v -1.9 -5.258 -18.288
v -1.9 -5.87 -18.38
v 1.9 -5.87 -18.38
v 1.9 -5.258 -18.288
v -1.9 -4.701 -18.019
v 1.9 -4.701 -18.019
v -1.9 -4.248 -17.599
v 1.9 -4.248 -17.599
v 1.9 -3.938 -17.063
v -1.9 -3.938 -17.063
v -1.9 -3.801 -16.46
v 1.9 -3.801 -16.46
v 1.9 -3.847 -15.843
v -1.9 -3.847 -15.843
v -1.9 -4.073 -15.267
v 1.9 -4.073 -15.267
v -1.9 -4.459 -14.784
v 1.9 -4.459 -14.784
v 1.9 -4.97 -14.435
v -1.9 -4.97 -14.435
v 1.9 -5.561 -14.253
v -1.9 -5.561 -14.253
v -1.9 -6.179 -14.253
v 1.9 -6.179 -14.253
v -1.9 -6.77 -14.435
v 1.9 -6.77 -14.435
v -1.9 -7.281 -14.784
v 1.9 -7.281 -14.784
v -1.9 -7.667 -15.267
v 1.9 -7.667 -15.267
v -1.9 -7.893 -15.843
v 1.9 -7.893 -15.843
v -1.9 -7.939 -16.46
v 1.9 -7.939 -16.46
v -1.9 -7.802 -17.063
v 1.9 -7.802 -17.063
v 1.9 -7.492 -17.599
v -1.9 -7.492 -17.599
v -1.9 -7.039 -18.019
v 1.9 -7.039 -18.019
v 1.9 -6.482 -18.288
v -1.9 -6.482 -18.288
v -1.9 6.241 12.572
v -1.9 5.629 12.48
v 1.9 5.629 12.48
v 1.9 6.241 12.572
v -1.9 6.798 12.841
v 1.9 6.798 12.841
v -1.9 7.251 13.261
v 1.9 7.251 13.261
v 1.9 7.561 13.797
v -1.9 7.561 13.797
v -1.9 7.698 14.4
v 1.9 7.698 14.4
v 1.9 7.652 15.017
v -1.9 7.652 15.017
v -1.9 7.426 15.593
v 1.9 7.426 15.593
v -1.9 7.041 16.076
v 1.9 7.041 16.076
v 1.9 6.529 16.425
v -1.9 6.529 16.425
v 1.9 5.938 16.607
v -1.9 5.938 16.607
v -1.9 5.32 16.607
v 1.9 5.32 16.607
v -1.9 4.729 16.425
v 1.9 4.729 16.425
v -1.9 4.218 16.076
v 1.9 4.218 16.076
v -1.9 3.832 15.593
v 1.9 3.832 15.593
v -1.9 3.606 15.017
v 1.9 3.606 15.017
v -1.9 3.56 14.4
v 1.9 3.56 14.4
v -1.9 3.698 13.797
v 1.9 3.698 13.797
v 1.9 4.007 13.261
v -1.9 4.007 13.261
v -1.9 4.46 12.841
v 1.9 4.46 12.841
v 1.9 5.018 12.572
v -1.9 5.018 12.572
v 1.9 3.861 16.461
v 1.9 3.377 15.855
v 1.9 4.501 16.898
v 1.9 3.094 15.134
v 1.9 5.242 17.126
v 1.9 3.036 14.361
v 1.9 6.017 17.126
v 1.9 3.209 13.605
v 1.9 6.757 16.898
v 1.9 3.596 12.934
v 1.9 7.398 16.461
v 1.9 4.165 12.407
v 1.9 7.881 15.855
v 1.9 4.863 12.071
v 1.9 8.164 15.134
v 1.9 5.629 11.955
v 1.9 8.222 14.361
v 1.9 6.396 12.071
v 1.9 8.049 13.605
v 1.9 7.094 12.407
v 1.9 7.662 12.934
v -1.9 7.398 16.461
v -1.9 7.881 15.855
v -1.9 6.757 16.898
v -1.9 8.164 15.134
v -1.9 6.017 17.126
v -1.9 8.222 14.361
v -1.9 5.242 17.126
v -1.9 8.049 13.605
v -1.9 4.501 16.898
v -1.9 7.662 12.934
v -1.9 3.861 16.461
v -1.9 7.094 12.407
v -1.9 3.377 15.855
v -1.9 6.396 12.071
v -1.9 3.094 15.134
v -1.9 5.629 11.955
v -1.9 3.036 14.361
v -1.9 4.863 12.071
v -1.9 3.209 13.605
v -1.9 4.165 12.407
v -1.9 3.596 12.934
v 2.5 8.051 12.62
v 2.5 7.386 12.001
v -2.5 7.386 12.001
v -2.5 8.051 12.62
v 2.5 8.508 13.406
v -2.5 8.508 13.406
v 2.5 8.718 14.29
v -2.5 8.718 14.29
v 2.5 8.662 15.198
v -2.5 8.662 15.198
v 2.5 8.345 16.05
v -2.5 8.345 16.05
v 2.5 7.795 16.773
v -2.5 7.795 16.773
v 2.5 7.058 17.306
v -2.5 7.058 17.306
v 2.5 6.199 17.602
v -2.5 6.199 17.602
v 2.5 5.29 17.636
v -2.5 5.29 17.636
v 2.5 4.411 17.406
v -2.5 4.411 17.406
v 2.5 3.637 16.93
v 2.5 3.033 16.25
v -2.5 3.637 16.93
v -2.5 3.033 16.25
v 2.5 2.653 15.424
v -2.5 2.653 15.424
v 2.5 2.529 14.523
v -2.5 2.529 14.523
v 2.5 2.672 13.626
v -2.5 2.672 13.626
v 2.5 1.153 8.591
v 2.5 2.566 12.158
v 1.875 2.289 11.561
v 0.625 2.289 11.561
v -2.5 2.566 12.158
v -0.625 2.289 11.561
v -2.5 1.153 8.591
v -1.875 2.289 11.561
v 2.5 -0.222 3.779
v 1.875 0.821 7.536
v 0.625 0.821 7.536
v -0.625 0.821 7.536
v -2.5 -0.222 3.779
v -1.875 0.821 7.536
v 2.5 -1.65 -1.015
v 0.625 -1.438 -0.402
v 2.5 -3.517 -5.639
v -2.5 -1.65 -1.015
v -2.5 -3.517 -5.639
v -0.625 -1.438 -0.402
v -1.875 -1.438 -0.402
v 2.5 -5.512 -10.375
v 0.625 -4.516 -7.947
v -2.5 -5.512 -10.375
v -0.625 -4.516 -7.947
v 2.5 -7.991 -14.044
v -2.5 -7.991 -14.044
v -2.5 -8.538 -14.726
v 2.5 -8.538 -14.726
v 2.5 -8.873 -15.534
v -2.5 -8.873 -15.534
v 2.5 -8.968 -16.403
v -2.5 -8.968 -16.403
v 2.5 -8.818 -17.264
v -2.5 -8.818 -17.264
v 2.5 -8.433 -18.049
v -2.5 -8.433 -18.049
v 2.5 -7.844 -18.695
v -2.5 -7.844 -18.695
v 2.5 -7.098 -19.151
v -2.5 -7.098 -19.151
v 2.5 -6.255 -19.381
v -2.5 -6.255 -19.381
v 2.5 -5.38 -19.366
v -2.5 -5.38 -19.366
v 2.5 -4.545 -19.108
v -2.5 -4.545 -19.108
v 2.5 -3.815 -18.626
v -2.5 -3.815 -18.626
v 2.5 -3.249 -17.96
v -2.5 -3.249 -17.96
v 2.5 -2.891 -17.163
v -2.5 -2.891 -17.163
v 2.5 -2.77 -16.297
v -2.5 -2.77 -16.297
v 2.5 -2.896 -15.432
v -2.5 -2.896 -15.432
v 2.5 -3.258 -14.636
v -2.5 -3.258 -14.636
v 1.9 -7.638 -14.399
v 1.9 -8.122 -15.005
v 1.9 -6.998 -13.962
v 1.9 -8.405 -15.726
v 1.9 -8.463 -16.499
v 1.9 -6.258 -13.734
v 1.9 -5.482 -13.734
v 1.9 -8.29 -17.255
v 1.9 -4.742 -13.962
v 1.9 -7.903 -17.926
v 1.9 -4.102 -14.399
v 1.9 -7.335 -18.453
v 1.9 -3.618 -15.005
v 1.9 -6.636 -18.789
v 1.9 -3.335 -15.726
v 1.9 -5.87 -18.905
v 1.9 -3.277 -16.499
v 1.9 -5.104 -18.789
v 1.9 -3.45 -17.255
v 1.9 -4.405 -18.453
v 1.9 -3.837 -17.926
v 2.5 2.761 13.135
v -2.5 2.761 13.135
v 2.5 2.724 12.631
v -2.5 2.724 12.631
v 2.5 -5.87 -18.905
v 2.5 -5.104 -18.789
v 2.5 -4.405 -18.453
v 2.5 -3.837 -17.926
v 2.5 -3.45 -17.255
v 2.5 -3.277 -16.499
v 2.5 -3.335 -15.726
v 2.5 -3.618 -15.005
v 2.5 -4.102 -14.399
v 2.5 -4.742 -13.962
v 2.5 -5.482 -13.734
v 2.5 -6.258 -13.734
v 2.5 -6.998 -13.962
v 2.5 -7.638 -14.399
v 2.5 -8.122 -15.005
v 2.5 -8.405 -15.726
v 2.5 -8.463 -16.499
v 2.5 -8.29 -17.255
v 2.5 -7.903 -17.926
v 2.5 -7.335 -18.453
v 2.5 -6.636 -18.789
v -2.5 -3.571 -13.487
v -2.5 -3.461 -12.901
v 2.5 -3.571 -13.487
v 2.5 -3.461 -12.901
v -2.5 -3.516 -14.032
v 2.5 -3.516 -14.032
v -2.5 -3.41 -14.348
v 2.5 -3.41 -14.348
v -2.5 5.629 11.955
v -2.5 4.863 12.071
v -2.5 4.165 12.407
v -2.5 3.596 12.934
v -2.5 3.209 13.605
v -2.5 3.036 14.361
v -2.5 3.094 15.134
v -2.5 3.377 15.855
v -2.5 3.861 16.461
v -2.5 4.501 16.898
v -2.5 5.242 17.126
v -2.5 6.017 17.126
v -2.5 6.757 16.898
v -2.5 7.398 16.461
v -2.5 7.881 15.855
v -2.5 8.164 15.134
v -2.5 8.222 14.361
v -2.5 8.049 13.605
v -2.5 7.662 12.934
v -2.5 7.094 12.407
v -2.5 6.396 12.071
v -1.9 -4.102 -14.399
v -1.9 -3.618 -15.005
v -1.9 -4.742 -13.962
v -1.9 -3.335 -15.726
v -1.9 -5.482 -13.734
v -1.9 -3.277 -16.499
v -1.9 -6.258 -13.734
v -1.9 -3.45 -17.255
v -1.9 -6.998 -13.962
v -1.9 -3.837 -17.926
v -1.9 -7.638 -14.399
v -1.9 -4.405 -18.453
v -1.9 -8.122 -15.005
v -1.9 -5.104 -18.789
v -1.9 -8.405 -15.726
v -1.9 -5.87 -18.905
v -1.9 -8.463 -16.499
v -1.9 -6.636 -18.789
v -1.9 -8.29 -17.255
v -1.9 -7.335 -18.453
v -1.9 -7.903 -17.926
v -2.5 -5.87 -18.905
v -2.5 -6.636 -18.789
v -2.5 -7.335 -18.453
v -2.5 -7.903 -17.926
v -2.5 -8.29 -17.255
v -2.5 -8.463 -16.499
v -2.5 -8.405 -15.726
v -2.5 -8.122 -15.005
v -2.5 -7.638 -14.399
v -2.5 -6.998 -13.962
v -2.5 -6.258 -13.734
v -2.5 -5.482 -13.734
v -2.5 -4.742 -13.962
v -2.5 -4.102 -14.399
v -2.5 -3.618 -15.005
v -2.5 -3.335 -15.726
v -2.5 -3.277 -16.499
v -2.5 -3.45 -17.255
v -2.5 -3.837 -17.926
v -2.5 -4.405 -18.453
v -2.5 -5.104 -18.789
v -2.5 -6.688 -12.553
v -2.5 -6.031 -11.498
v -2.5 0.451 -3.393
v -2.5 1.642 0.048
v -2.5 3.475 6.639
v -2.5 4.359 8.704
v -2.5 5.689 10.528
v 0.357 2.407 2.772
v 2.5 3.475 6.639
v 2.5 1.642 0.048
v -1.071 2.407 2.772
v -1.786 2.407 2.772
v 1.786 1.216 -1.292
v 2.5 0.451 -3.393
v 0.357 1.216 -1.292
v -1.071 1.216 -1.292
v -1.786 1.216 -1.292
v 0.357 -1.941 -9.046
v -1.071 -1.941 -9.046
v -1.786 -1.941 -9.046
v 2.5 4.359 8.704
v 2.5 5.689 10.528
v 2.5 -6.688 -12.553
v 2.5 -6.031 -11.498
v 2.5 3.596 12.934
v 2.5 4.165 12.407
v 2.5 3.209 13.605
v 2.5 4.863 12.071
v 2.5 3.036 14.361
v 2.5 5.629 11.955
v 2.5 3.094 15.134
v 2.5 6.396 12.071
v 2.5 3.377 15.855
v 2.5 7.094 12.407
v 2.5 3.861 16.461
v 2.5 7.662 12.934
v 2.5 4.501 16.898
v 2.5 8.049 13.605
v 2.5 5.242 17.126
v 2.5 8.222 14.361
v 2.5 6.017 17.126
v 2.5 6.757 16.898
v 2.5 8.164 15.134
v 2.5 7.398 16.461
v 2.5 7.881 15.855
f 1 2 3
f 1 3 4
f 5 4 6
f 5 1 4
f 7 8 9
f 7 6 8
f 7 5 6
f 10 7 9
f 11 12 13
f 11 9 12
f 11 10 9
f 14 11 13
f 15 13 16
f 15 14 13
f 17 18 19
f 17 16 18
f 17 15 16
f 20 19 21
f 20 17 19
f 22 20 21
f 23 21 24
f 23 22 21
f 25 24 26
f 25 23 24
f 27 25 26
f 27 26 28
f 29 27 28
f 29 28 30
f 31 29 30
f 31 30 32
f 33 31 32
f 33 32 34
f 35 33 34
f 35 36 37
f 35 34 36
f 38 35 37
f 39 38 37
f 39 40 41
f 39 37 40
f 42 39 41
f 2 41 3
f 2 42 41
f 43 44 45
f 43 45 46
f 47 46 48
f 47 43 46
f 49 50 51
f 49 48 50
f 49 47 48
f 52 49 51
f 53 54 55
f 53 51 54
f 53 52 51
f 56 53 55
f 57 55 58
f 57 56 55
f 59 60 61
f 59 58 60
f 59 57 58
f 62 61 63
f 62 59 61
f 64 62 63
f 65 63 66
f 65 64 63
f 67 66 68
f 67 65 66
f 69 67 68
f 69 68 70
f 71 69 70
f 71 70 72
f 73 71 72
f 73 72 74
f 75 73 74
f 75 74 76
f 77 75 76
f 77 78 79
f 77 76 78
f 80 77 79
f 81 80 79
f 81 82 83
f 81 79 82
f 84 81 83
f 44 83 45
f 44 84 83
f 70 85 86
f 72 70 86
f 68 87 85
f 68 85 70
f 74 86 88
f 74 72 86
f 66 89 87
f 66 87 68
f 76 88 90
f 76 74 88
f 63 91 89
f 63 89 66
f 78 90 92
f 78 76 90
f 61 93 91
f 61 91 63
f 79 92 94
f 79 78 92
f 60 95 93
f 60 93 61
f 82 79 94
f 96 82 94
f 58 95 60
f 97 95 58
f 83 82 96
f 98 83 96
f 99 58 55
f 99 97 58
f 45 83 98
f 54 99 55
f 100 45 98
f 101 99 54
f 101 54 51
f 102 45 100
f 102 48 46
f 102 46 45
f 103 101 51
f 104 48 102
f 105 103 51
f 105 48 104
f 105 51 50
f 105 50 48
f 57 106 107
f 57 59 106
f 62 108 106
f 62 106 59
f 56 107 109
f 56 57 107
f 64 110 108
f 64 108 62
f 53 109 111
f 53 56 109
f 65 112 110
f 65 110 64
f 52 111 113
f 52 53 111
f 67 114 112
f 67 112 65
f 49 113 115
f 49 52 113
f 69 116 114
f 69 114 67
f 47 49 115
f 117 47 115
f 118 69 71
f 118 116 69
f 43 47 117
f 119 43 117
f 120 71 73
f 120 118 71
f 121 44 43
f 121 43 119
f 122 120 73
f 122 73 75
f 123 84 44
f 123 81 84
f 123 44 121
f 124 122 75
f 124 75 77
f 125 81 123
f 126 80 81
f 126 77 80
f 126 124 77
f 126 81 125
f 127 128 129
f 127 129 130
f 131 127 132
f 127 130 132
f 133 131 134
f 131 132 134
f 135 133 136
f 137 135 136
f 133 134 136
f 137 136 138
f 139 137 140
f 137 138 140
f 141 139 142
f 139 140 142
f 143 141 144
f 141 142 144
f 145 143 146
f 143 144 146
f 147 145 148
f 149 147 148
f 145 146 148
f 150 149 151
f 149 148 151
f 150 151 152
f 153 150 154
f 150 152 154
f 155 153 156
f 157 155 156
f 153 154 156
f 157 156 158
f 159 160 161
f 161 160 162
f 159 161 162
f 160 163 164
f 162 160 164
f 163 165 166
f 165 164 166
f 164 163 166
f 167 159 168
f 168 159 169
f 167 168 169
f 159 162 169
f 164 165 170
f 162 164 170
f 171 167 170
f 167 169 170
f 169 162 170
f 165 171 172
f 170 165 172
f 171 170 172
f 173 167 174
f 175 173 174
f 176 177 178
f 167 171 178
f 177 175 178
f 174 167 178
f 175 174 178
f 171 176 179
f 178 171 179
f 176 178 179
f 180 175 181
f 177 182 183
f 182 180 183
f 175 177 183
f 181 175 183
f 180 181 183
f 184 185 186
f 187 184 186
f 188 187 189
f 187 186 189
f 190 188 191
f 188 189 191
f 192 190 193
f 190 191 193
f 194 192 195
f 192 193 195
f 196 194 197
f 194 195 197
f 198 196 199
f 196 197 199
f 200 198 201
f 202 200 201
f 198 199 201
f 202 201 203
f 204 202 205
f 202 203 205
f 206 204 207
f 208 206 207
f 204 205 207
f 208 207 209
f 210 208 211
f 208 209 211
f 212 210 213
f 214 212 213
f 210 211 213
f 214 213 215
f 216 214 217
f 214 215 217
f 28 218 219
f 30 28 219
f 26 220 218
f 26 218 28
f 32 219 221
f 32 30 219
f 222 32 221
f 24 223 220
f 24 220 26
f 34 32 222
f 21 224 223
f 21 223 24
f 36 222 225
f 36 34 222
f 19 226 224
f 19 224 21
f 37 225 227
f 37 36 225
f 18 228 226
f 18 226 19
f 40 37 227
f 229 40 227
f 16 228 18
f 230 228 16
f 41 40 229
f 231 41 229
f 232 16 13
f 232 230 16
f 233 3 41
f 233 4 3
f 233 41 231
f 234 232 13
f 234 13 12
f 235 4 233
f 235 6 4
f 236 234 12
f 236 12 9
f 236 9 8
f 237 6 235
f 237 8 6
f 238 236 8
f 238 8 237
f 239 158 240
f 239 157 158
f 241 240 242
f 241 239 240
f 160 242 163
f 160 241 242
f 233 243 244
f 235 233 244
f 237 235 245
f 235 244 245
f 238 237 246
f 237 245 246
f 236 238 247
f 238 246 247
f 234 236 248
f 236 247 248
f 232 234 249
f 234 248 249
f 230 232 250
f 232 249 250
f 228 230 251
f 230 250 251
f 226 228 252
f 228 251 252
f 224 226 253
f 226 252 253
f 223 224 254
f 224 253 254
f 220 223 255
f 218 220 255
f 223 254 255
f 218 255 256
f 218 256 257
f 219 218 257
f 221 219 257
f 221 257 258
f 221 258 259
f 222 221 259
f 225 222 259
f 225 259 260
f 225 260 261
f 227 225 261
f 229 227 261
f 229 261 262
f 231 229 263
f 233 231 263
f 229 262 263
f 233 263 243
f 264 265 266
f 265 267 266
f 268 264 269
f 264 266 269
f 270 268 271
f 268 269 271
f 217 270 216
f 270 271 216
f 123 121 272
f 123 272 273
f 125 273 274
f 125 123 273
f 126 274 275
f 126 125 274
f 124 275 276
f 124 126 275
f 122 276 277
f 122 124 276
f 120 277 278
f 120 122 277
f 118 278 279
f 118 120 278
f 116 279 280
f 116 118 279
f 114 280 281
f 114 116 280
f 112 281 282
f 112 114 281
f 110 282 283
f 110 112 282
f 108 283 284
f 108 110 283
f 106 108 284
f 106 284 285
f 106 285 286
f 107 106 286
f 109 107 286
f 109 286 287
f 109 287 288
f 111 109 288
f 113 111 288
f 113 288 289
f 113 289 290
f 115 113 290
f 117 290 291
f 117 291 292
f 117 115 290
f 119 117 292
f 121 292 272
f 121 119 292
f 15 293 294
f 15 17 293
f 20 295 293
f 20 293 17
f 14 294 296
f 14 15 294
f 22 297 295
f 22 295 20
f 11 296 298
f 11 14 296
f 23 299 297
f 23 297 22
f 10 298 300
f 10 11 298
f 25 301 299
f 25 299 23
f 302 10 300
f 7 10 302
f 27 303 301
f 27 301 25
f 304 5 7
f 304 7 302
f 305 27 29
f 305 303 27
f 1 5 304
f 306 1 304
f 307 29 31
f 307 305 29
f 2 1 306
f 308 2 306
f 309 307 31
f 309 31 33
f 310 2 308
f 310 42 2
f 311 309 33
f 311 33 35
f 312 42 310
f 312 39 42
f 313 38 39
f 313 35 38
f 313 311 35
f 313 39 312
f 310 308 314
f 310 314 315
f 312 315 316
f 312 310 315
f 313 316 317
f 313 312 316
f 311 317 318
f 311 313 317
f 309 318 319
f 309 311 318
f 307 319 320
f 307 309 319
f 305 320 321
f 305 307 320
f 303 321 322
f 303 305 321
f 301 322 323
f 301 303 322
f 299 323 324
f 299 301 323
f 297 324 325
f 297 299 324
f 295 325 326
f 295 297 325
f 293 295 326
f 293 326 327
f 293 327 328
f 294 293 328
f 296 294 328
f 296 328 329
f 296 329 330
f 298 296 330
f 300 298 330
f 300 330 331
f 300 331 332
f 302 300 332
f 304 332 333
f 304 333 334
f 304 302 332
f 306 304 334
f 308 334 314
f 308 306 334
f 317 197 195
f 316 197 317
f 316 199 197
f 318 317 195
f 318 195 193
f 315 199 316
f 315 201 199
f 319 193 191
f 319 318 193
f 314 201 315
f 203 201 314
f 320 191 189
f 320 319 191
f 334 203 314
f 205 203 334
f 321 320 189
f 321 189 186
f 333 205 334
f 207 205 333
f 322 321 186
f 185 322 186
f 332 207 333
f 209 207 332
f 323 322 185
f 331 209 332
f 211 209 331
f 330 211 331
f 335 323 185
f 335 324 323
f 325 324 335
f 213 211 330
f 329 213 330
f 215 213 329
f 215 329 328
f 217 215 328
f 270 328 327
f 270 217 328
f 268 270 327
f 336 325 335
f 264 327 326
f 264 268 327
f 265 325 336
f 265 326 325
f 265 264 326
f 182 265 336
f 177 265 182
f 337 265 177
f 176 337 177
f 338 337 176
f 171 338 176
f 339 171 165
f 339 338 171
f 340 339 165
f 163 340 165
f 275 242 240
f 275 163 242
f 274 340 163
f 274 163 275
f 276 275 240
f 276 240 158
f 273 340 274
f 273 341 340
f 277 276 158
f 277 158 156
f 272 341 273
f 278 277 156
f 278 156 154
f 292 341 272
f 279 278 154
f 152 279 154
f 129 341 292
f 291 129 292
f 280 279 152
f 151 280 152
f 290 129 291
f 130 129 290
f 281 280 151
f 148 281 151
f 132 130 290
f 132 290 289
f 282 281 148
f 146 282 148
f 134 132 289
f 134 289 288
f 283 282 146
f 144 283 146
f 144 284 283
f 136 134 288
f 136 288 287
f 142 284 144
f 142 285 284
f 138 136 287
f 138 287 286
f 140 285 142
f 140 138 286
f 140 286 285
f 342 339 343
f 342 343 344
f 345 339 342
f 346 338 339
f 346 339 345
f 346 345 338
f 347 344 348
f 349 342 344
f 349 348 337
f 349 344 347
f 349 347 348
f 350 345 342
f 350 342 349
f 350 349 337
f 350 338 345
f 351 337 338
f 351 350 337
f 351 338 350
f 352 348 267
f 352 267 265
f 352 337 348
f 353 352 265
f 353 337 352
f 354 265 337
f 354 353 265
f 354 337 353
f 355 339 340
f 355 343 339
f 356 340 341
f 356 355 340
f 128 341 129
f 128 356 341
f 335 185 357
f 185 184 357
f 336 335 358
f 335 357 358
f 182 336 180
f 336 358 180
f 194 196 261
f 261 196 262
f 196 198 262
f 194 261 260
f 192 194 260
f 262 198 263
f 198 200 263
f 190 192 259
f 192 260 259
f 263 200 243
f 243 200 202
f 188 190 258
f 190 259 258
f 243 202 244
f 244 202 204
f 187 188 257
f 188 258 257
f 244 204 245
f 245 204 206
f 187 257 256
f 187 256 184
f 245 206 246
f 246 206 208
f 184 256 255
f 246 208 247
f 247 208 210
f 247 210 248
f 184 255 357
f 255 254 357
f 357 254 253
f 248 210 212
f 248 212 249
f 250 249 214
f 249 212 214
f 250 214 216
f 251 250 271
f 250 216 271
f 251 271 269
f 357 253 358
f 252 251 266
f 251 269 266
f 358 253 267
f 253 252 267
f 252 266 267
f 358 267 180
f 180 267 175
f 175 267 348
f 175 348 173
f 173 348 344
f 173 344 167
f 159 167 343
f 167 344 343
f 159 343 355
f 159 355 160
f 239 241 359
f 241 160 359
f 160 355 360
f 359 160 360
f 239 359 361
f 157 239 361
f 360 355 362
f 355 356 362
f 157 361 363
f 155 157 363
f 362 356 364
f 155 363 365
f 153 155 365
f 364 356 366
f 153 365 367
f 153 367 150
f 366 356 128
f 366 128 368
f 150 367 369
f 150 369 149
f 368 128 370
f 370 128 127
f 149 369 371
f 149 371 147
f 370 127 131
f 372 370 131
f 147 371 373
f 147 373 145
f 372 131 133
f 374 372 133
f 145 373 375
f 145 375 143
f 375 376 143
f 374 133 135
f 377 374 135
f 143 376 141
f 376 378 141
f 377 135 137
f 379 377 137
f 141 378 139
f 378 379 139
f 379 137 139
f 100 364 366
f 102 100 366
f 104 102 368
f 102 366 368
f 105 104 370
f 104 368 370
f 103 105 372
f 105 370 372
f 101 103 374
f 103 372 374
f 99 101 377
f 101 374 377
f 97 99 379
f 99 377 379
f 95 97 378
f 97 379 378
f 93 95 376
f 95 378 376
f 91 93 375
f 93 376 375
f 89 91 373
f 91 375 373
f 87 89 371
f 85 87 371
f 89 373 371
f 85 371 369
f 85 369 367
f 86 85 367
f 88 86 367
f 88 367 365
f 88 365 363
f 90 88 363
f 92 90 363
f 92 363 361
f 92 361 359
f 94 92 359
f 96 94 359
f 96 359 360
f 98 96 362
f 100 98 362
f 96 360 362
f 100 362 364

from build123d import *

# Parameters (mm, degrees)
BOSS_EXTRUDE1_START     = -2.5
BOSS_EXTRUDE1_OUTLINE_R = 2.075
BOSS_EXTRUDE1_DEPTH     = 5
FILLET1_R               = 10
FILLET2_R               = 2
SKETCH6_R               = 2.6
CUT_EXTRUDE3_DEPTH      = 0.6
CUT_EXTRUDE4_START      = -0.6
SKETCH7_R               = 2.6
CUT_EXTRUDE4_DEPTH      = 0.6


# Read off the part's stored shape, not the designer's step: Boss-Extrude1
with BuildPart() as part:
    # Boss-Extrude1 outline → Boss-Extrude1 (new body)
    with BuildSketch(Plane(origin=(0, 0, 0), x_dir=(0, 0, -1), z_dir=(1, 0, 0)).offset(BOSS_EXTRUDE1_START)):
        with BuildLine():
            add(Edge.make_bspline(
                [(-11.467537503, 5.350641642), (-9.989640807, 4.583198508), (-7.178473446, 3.56515844), (-2.794711607, 2.423489001), (1.31753402, 1.289926051), (5.278860449, -0.285822235), (9.053028754, -1.966642772), (11.935810136, -3.144477132), (13.583881592, -3.694358455), (13.981041238, -3.818362685)],
                knots=[0.086674, 0.086674, 0.086674, 0.086674, 0.25, 0.375, 0.5, 0.625, 0.75, 0.875, 0.914505017, 0.914505017, 0.914505017, 0.914505017], degree=3))
            ThreePointArc((-11.467537503, 5.350641642), (-17.181514848, 7.27580405), (-12.959070193, 2.971533086))
            add(Edge.make_bspline(
                [(-12.959070193, 2.971533086), (-12.497149124, 2.725216721), (-10.724559711, 1.865083664), (-7.538415314, 0.763759759), (-3.469271241, -0.293699416), (0.432825124, -1.371499483), (4.151444935, -2.850197037), (7.925726422, -4.529354156), (10.977952232, -5.779484012), (12.799789723, -6.384662727), (13.276371809, -6.531370761)],
                knots=[0.080415635, 0.080415635, 0.080415635, 0.080415635, 0.125, 0.25, 0.375, 0.5, 0.625, 0.75, 0.875, 0.9184538, 0.9184538, 0.9184538, 0.9184538], degree=3))
            ThreePointArc((13.276371809, -6.531370761), (19.30544163, -6.649326649), (13.981041238, -3.818362685))
        make_face()
        with Locations((16.305, -5.87)):
            Circle(BOSS_EXTRUDE1_OUTLINE_R, mode=Mode.SUBTRACT)
        with Locations((-14.555, 5.629165125)):
            Circle(BOSS_EXTRUDE1_OUTLINE_R, mode=Mode.SUBTRACT)
    extrude(amount=BOSS_EXTRUDE1_DEPTH)

    # Fillet1
    fillet1_edges = [part.edges().sort_by_distance(p)[0] for p in [
        (0, -6.531370761, -13.276371809),
        (0, 5.350641642, 11.467537503),
    ]]
    fillet(fillet1_edges, radius=FILLET1_R)

    # Fillet2
    fillet2_edges = [part.edges().sort_by_distance(p)[0] for p in [
        (0, -3.818362685, -13.981041238),
        (0, 2.971533086, 12.959070193),
    ]]
    fillet(fillet2_edges, radius=FILLET2_R)

    # Sketch6 → Cut-Extrude3 (cut)
    with BuildSketch(Plane(origin=(2.5, 0, 0), x_dir=(0, 0, -1), z_dir=(1, 0, 0))):
        with Locations((-14.555, 5.629165125)):
            Circle(SKETCH6_R)
        with Locations((16.305, -5.87)):
            Circle(SKETCH6_R)
    extrude(amount=-CUT_EXTRUDE3_DEPTH, mode=Mode.SUBTRACT)

    # Sketch7 → Cut-Extrude4 (cut)
    with BuildSketch(Plane.ZY.offset(2.5).offset(CUT_EXTRUDE4_START)):
        with Locations(Location((14.555, 5.629165125, 0), (0, 0, 180))):
            Circle(SKETCH7_R)
        with Locations(Location((-16.305, -5.87, 0), (0, 0, 180))):
            Circle(SKETCH7_R)
    extrude(amount=CUT_EXTRUDE4_DEPTH, mode=Mode.SUBTRACT)


solid = part.part
